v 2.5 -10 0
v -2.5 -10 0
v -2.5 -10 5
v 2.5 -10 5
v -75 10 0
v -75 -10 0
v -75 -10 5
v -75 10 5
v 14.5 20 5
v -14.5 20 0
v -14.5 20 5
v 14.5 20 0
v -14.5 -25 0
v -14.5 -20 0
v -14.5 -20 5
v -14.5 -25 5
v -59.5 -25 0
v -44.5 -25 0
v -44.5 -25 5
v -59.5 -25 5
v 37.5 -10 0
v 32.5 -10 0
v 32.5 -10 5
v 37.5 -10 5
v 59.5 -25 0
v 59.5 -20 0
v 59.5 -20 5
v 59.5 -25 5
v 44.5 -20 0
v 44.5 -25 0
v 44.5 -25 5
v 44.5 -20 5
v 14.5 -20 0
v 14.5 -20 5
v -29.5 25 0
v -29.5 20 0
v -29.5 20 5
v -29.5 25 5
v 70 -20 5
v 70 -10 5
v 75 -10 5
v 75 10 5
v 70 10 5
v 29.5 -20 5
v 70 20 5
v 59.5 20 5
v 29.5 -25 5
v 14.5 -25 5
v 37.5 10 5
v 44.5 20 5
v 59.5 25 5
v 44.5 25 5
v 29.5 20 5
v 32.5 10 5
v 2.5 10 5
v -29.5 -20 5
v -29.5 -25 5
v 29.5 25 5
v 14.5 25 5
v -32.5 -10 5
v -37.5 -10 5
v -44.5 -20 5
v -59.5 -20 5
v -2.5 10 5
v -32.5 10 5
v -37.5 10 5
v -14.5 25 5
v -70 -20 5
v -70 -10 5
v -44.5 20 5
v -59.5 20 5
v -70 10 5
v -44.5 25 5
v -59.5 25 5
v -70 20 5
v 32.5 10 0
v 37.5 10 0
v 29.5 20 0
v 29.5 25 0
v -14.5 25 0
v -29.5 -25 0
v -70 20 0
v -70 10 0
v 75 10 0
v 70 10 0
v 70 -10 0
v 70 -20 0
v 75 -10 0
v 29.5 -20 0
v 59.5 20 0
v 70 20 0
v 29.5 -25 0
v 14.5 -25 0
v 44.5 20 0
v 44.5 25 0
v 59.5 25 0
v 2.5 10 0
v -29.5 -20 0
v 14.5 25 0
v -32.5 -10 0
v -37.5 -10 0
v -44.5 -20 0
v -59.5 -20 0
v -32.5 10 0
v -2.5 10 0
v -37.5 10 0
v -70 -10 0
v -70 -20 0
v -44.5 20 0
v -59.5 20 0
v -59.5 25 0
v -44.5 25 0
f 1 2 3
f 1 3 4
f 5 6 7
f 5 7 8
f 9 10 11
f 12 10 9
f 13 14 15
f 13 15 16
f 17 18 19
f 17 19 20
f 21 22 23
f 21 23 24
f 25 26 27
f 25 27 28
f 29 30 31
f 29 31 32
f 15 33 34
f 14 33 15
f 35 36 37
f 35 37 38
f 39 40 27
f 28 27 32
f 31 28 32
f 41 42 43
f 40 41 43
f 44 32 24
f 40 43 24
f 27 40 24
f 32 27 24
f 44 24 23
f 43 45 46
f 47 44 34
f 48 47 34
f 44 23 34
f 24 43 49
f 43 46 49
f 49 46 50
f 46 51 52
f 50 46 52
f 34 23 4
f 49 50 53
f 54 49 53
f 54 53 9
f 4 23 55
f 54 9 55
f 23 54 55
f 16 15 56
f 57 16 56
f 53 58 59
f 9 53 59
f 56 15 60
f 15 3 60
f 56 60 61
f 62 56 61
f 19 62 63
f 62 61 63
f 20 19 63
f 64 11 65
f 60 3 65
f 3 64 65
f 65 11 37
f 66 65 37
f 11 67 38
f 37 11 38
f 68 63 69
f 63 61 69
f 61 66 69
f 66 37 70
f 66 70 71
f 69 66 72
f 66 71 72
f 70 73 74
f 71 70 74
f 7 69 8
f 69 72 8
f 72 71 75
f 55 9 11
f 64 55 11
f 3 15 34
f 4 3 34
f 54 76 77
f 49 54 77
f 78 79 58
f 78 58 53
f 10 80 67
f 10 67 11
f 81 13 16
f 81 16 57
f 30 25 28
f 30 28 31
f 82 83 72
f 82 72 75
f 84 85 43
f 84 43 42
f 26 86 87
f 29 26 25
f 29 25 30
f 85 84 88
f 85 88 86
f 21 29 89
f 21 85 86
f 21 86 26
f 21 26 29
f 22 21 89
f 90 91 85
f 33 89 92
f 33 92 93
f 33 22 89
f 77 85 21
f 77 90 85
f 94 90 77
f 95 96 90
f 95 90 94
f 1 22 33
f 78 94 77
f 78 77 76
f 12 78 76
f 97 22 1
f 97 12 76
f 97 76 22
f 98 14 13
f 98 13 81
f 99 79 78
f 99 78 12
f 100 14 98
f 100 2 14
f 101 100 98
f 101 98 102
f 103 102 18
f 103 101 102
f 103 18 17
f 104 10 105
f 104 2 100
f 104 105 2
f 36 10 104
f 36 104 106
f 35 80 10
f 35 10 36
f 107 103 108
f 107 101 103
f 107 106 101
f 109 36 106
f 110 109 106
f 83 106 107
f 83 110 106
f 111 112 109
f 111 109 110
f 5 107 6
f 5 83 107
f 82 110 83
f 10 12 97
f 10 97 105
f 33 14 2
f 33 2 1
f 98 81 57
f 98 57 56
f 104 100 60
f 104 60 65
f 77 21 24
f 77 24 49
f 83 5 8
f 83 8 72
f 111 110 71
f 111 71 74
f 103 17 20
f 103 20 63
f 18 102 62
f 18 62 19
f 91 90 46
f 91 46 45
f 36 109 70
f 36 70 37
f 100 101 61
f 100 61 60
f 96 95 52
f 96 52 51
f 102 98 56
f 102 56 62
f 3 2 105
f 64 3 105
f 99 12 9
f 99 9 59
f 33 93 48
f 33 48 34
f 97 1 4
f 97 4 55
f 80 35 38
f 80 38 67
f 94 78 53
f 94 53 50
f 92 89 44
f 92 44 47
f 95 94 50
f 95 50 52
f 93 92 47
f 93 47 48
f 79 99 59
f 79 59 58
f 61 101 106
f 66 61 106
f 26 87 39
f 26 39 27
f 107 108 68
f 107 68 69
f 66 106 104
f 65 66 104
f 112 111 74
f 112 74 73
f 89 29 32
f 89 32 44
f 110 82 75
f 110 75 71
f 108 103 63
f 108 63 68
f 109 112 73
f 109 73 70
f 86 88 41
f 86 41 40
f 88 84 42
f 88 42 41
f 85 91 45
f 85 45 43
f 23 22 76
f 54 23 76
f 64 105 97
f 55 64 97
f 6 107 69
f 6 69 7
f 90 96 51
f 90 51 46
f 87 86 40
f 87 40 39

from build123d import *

# Parameters (mm, degrees)
SKETCH1_W           = 5
SKETCH1_H           = 20
BOSS_EXTRUDE1_DEPTH = 5


with BuildPart() as part:
    # Sketch1 → Boss-Extrude1 (new body)
    with BuildSketch(Plane.XY):
        Polygon((-70, 20), (-59.5, 20), (-59.5, 25), (-44.5, 25), (-44.5, 20), (-29.5, 20), (-29.5, 25), (-14.5, 25), (-14.5, 20), (14.5, 20), (14.5, 25), (29.5, 25), (29.5, 20), (44.5, 20), (44.5, 25), (59.5, 25), (59.5, 20), (70, 20), (70, 10), (75, 10), (75, -10), (70, -10), (70, -20), (59.5, -20), (59.5, -25), (44.5, -25), (44.5, -20), (29.5, -20), (29.5, -25), (14.5, -25), (14.5, -20), (-14.5, -20), (-14.5, -25), (-29.5, -25), (-29.5, -20), (-44.5, -20), (-44.5, -25), (-59.5, -25), (-59.5, -20), (-70, -20), (-70, -10), (-75, -10), (-75, 10), (-70, 10), align=None)
        with Locations((35, 0)):
            Rectangle(SKETCH1_W, SKETCH1_H, mode=Mode.SUBTRACT)
        Rectangle(SKETCH1_W, SKETCH1_H, mode=Mode.SUBTRACT)
        with Locations((-35, 0)):
            Rectangle(SKETCH1_W, SKETCH1_H, mode=Mode.SUBTRACT)
    extrude(amount=BOSS_EXTRUDE1_DEPTH)


solid = part.part
